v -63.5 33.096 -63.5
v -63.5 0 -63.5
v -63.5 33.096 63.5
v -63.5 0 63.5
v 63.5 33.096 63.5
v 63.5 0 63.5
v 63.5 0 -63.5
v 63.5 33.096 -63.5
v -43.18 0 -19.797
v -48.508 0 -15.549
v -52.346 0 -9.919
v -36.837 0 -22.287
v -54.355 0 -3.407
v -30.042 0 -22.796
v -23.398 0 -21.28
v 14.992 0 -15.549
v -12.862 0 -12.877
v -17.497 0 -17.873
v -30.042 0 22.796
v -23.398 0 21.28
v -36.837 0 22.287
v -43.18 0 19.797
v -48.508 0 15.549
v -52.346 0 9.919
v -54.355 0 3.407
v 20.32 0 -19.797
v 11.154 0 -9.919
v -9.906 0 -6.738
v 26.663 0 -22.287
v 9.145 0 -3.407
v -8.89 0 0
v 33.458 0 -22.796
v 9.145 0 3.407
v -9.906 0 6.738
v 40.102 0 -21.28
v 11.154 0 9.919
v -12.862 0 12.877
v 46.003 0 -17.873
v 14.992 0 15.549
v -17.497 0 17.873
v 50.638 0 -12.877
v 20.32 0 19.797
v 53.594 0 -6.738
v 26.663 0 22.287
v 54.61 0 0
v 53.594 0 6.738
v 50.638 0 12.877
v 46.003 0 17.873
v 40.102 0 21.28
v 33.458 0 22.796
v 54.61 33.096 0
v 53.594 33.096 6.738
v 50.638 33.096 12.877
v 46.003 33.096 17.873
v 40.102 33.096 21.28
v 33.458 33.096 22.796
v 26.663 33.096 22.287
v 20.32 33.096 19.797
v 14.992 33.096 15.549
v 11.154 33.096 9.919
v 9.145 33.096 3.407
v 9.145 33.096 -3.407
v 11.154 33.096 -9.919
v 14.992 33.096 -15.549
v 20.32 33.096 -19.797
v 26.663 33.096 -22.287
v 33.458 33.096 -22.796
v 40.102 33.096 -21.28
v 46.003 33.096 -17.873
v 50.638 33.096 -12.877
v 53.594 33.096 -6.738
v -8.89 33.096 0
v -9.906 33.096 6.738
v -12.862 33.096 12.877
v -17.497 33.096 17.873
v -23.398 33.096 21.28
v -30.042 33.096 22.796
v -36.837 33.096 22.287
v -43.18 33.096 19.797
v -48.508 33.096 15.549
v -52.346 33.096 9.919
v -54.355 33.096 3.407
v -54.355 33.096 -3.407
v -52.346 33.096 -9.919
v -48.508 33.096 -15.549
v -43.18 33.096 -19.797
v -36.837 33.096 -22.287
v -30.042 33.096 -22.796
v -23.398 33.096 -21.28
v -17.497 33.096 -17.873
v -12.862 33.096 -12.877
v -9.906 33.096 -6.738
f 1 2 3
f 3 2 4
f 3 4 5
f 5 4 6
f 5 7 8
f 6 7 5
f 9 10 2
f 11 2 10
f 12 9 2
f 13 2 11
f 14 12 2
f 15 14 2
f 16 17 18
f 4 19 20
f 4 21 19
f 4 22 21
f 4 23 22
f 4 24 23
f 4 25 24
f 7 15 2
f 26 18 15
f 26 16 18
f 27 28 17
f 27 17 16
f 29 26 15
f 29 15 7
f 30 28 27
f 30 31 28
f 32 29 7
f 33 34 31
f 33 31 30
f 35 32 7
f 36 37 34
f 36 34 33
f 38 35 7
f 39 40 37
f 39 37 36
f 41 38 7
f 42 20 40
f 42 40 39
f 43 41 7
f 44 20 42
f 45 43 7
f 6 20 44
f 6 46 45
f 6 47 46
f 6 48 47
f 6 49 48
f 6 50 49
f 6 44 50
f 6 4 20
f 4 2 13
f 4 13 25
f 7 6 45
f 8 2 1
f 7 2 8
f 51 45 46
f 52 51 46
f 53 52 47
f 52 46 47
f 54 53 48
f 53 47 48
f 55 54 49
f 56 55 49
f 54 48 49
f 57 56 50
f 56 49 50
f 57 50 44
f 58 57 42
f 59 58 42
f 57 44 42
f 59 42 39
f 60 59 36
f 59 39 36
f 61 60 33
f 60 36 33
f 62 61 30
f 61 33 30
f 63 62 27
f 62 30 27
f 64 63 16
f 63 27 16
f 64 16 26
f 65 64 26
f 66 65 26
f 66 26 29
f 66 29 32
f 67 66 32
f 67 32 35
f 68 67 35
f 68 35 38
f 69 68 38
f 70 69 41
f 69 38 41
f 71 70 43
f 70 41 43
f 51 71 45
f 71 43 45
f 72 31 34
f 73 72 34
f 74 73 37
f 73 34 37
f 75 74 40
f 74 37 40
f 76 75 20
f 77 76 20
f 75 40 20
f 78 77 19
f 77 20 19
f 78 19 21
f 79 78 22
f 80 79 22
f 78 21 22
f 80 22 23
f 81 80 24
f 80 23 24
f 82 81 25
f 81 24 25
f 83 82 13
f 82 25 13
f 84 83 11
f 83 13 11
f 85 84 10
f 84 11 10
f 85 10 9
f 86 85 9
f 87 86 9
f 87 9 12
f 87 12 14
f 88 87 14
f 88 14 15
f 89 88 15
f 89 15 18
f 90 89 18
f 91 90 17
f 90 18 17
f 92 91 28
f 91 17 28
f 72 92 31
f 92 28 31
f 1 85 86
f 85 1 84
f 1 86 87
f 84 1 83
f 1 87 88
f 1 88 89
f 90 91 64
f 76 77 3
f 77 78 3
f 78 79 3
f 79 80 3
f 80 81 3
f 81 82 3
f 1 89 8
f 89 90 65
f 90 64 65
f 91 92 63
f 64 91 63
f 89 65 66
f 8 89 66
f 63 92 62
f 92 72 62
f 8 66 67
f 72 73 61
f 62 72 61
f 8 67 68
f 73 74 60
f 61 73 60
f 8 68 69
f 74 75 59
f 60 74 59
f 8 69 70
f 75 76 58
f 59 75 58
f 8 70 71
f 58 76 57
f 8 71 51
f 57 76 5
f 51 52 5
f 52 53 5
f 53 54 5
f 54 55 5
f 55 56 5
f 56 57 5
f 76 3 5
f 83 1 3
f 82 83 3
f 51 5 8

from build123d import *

# Parameters (mm, degrees)
F0_W     = 127
F0_H     = 127
F0_R     = 22.86
F1_DEPTH = 33.0962


with BuildPart() as f1:
    # F0 (on Front) → F1 (new body)
    with BuildSketch(Plane.XZ):
        Rectangle(F0_W, F0_H)
        with Locations((-31.75, 0)):
            Circle(F0_R, mode=Mode.SUBTRACT)
        with Locations((31.75, 0)):
            Circle(F0_R, mode=Mode.SUBTRACT)
    extrude(amount=-F1_DEPTH)


solid = f1.part
